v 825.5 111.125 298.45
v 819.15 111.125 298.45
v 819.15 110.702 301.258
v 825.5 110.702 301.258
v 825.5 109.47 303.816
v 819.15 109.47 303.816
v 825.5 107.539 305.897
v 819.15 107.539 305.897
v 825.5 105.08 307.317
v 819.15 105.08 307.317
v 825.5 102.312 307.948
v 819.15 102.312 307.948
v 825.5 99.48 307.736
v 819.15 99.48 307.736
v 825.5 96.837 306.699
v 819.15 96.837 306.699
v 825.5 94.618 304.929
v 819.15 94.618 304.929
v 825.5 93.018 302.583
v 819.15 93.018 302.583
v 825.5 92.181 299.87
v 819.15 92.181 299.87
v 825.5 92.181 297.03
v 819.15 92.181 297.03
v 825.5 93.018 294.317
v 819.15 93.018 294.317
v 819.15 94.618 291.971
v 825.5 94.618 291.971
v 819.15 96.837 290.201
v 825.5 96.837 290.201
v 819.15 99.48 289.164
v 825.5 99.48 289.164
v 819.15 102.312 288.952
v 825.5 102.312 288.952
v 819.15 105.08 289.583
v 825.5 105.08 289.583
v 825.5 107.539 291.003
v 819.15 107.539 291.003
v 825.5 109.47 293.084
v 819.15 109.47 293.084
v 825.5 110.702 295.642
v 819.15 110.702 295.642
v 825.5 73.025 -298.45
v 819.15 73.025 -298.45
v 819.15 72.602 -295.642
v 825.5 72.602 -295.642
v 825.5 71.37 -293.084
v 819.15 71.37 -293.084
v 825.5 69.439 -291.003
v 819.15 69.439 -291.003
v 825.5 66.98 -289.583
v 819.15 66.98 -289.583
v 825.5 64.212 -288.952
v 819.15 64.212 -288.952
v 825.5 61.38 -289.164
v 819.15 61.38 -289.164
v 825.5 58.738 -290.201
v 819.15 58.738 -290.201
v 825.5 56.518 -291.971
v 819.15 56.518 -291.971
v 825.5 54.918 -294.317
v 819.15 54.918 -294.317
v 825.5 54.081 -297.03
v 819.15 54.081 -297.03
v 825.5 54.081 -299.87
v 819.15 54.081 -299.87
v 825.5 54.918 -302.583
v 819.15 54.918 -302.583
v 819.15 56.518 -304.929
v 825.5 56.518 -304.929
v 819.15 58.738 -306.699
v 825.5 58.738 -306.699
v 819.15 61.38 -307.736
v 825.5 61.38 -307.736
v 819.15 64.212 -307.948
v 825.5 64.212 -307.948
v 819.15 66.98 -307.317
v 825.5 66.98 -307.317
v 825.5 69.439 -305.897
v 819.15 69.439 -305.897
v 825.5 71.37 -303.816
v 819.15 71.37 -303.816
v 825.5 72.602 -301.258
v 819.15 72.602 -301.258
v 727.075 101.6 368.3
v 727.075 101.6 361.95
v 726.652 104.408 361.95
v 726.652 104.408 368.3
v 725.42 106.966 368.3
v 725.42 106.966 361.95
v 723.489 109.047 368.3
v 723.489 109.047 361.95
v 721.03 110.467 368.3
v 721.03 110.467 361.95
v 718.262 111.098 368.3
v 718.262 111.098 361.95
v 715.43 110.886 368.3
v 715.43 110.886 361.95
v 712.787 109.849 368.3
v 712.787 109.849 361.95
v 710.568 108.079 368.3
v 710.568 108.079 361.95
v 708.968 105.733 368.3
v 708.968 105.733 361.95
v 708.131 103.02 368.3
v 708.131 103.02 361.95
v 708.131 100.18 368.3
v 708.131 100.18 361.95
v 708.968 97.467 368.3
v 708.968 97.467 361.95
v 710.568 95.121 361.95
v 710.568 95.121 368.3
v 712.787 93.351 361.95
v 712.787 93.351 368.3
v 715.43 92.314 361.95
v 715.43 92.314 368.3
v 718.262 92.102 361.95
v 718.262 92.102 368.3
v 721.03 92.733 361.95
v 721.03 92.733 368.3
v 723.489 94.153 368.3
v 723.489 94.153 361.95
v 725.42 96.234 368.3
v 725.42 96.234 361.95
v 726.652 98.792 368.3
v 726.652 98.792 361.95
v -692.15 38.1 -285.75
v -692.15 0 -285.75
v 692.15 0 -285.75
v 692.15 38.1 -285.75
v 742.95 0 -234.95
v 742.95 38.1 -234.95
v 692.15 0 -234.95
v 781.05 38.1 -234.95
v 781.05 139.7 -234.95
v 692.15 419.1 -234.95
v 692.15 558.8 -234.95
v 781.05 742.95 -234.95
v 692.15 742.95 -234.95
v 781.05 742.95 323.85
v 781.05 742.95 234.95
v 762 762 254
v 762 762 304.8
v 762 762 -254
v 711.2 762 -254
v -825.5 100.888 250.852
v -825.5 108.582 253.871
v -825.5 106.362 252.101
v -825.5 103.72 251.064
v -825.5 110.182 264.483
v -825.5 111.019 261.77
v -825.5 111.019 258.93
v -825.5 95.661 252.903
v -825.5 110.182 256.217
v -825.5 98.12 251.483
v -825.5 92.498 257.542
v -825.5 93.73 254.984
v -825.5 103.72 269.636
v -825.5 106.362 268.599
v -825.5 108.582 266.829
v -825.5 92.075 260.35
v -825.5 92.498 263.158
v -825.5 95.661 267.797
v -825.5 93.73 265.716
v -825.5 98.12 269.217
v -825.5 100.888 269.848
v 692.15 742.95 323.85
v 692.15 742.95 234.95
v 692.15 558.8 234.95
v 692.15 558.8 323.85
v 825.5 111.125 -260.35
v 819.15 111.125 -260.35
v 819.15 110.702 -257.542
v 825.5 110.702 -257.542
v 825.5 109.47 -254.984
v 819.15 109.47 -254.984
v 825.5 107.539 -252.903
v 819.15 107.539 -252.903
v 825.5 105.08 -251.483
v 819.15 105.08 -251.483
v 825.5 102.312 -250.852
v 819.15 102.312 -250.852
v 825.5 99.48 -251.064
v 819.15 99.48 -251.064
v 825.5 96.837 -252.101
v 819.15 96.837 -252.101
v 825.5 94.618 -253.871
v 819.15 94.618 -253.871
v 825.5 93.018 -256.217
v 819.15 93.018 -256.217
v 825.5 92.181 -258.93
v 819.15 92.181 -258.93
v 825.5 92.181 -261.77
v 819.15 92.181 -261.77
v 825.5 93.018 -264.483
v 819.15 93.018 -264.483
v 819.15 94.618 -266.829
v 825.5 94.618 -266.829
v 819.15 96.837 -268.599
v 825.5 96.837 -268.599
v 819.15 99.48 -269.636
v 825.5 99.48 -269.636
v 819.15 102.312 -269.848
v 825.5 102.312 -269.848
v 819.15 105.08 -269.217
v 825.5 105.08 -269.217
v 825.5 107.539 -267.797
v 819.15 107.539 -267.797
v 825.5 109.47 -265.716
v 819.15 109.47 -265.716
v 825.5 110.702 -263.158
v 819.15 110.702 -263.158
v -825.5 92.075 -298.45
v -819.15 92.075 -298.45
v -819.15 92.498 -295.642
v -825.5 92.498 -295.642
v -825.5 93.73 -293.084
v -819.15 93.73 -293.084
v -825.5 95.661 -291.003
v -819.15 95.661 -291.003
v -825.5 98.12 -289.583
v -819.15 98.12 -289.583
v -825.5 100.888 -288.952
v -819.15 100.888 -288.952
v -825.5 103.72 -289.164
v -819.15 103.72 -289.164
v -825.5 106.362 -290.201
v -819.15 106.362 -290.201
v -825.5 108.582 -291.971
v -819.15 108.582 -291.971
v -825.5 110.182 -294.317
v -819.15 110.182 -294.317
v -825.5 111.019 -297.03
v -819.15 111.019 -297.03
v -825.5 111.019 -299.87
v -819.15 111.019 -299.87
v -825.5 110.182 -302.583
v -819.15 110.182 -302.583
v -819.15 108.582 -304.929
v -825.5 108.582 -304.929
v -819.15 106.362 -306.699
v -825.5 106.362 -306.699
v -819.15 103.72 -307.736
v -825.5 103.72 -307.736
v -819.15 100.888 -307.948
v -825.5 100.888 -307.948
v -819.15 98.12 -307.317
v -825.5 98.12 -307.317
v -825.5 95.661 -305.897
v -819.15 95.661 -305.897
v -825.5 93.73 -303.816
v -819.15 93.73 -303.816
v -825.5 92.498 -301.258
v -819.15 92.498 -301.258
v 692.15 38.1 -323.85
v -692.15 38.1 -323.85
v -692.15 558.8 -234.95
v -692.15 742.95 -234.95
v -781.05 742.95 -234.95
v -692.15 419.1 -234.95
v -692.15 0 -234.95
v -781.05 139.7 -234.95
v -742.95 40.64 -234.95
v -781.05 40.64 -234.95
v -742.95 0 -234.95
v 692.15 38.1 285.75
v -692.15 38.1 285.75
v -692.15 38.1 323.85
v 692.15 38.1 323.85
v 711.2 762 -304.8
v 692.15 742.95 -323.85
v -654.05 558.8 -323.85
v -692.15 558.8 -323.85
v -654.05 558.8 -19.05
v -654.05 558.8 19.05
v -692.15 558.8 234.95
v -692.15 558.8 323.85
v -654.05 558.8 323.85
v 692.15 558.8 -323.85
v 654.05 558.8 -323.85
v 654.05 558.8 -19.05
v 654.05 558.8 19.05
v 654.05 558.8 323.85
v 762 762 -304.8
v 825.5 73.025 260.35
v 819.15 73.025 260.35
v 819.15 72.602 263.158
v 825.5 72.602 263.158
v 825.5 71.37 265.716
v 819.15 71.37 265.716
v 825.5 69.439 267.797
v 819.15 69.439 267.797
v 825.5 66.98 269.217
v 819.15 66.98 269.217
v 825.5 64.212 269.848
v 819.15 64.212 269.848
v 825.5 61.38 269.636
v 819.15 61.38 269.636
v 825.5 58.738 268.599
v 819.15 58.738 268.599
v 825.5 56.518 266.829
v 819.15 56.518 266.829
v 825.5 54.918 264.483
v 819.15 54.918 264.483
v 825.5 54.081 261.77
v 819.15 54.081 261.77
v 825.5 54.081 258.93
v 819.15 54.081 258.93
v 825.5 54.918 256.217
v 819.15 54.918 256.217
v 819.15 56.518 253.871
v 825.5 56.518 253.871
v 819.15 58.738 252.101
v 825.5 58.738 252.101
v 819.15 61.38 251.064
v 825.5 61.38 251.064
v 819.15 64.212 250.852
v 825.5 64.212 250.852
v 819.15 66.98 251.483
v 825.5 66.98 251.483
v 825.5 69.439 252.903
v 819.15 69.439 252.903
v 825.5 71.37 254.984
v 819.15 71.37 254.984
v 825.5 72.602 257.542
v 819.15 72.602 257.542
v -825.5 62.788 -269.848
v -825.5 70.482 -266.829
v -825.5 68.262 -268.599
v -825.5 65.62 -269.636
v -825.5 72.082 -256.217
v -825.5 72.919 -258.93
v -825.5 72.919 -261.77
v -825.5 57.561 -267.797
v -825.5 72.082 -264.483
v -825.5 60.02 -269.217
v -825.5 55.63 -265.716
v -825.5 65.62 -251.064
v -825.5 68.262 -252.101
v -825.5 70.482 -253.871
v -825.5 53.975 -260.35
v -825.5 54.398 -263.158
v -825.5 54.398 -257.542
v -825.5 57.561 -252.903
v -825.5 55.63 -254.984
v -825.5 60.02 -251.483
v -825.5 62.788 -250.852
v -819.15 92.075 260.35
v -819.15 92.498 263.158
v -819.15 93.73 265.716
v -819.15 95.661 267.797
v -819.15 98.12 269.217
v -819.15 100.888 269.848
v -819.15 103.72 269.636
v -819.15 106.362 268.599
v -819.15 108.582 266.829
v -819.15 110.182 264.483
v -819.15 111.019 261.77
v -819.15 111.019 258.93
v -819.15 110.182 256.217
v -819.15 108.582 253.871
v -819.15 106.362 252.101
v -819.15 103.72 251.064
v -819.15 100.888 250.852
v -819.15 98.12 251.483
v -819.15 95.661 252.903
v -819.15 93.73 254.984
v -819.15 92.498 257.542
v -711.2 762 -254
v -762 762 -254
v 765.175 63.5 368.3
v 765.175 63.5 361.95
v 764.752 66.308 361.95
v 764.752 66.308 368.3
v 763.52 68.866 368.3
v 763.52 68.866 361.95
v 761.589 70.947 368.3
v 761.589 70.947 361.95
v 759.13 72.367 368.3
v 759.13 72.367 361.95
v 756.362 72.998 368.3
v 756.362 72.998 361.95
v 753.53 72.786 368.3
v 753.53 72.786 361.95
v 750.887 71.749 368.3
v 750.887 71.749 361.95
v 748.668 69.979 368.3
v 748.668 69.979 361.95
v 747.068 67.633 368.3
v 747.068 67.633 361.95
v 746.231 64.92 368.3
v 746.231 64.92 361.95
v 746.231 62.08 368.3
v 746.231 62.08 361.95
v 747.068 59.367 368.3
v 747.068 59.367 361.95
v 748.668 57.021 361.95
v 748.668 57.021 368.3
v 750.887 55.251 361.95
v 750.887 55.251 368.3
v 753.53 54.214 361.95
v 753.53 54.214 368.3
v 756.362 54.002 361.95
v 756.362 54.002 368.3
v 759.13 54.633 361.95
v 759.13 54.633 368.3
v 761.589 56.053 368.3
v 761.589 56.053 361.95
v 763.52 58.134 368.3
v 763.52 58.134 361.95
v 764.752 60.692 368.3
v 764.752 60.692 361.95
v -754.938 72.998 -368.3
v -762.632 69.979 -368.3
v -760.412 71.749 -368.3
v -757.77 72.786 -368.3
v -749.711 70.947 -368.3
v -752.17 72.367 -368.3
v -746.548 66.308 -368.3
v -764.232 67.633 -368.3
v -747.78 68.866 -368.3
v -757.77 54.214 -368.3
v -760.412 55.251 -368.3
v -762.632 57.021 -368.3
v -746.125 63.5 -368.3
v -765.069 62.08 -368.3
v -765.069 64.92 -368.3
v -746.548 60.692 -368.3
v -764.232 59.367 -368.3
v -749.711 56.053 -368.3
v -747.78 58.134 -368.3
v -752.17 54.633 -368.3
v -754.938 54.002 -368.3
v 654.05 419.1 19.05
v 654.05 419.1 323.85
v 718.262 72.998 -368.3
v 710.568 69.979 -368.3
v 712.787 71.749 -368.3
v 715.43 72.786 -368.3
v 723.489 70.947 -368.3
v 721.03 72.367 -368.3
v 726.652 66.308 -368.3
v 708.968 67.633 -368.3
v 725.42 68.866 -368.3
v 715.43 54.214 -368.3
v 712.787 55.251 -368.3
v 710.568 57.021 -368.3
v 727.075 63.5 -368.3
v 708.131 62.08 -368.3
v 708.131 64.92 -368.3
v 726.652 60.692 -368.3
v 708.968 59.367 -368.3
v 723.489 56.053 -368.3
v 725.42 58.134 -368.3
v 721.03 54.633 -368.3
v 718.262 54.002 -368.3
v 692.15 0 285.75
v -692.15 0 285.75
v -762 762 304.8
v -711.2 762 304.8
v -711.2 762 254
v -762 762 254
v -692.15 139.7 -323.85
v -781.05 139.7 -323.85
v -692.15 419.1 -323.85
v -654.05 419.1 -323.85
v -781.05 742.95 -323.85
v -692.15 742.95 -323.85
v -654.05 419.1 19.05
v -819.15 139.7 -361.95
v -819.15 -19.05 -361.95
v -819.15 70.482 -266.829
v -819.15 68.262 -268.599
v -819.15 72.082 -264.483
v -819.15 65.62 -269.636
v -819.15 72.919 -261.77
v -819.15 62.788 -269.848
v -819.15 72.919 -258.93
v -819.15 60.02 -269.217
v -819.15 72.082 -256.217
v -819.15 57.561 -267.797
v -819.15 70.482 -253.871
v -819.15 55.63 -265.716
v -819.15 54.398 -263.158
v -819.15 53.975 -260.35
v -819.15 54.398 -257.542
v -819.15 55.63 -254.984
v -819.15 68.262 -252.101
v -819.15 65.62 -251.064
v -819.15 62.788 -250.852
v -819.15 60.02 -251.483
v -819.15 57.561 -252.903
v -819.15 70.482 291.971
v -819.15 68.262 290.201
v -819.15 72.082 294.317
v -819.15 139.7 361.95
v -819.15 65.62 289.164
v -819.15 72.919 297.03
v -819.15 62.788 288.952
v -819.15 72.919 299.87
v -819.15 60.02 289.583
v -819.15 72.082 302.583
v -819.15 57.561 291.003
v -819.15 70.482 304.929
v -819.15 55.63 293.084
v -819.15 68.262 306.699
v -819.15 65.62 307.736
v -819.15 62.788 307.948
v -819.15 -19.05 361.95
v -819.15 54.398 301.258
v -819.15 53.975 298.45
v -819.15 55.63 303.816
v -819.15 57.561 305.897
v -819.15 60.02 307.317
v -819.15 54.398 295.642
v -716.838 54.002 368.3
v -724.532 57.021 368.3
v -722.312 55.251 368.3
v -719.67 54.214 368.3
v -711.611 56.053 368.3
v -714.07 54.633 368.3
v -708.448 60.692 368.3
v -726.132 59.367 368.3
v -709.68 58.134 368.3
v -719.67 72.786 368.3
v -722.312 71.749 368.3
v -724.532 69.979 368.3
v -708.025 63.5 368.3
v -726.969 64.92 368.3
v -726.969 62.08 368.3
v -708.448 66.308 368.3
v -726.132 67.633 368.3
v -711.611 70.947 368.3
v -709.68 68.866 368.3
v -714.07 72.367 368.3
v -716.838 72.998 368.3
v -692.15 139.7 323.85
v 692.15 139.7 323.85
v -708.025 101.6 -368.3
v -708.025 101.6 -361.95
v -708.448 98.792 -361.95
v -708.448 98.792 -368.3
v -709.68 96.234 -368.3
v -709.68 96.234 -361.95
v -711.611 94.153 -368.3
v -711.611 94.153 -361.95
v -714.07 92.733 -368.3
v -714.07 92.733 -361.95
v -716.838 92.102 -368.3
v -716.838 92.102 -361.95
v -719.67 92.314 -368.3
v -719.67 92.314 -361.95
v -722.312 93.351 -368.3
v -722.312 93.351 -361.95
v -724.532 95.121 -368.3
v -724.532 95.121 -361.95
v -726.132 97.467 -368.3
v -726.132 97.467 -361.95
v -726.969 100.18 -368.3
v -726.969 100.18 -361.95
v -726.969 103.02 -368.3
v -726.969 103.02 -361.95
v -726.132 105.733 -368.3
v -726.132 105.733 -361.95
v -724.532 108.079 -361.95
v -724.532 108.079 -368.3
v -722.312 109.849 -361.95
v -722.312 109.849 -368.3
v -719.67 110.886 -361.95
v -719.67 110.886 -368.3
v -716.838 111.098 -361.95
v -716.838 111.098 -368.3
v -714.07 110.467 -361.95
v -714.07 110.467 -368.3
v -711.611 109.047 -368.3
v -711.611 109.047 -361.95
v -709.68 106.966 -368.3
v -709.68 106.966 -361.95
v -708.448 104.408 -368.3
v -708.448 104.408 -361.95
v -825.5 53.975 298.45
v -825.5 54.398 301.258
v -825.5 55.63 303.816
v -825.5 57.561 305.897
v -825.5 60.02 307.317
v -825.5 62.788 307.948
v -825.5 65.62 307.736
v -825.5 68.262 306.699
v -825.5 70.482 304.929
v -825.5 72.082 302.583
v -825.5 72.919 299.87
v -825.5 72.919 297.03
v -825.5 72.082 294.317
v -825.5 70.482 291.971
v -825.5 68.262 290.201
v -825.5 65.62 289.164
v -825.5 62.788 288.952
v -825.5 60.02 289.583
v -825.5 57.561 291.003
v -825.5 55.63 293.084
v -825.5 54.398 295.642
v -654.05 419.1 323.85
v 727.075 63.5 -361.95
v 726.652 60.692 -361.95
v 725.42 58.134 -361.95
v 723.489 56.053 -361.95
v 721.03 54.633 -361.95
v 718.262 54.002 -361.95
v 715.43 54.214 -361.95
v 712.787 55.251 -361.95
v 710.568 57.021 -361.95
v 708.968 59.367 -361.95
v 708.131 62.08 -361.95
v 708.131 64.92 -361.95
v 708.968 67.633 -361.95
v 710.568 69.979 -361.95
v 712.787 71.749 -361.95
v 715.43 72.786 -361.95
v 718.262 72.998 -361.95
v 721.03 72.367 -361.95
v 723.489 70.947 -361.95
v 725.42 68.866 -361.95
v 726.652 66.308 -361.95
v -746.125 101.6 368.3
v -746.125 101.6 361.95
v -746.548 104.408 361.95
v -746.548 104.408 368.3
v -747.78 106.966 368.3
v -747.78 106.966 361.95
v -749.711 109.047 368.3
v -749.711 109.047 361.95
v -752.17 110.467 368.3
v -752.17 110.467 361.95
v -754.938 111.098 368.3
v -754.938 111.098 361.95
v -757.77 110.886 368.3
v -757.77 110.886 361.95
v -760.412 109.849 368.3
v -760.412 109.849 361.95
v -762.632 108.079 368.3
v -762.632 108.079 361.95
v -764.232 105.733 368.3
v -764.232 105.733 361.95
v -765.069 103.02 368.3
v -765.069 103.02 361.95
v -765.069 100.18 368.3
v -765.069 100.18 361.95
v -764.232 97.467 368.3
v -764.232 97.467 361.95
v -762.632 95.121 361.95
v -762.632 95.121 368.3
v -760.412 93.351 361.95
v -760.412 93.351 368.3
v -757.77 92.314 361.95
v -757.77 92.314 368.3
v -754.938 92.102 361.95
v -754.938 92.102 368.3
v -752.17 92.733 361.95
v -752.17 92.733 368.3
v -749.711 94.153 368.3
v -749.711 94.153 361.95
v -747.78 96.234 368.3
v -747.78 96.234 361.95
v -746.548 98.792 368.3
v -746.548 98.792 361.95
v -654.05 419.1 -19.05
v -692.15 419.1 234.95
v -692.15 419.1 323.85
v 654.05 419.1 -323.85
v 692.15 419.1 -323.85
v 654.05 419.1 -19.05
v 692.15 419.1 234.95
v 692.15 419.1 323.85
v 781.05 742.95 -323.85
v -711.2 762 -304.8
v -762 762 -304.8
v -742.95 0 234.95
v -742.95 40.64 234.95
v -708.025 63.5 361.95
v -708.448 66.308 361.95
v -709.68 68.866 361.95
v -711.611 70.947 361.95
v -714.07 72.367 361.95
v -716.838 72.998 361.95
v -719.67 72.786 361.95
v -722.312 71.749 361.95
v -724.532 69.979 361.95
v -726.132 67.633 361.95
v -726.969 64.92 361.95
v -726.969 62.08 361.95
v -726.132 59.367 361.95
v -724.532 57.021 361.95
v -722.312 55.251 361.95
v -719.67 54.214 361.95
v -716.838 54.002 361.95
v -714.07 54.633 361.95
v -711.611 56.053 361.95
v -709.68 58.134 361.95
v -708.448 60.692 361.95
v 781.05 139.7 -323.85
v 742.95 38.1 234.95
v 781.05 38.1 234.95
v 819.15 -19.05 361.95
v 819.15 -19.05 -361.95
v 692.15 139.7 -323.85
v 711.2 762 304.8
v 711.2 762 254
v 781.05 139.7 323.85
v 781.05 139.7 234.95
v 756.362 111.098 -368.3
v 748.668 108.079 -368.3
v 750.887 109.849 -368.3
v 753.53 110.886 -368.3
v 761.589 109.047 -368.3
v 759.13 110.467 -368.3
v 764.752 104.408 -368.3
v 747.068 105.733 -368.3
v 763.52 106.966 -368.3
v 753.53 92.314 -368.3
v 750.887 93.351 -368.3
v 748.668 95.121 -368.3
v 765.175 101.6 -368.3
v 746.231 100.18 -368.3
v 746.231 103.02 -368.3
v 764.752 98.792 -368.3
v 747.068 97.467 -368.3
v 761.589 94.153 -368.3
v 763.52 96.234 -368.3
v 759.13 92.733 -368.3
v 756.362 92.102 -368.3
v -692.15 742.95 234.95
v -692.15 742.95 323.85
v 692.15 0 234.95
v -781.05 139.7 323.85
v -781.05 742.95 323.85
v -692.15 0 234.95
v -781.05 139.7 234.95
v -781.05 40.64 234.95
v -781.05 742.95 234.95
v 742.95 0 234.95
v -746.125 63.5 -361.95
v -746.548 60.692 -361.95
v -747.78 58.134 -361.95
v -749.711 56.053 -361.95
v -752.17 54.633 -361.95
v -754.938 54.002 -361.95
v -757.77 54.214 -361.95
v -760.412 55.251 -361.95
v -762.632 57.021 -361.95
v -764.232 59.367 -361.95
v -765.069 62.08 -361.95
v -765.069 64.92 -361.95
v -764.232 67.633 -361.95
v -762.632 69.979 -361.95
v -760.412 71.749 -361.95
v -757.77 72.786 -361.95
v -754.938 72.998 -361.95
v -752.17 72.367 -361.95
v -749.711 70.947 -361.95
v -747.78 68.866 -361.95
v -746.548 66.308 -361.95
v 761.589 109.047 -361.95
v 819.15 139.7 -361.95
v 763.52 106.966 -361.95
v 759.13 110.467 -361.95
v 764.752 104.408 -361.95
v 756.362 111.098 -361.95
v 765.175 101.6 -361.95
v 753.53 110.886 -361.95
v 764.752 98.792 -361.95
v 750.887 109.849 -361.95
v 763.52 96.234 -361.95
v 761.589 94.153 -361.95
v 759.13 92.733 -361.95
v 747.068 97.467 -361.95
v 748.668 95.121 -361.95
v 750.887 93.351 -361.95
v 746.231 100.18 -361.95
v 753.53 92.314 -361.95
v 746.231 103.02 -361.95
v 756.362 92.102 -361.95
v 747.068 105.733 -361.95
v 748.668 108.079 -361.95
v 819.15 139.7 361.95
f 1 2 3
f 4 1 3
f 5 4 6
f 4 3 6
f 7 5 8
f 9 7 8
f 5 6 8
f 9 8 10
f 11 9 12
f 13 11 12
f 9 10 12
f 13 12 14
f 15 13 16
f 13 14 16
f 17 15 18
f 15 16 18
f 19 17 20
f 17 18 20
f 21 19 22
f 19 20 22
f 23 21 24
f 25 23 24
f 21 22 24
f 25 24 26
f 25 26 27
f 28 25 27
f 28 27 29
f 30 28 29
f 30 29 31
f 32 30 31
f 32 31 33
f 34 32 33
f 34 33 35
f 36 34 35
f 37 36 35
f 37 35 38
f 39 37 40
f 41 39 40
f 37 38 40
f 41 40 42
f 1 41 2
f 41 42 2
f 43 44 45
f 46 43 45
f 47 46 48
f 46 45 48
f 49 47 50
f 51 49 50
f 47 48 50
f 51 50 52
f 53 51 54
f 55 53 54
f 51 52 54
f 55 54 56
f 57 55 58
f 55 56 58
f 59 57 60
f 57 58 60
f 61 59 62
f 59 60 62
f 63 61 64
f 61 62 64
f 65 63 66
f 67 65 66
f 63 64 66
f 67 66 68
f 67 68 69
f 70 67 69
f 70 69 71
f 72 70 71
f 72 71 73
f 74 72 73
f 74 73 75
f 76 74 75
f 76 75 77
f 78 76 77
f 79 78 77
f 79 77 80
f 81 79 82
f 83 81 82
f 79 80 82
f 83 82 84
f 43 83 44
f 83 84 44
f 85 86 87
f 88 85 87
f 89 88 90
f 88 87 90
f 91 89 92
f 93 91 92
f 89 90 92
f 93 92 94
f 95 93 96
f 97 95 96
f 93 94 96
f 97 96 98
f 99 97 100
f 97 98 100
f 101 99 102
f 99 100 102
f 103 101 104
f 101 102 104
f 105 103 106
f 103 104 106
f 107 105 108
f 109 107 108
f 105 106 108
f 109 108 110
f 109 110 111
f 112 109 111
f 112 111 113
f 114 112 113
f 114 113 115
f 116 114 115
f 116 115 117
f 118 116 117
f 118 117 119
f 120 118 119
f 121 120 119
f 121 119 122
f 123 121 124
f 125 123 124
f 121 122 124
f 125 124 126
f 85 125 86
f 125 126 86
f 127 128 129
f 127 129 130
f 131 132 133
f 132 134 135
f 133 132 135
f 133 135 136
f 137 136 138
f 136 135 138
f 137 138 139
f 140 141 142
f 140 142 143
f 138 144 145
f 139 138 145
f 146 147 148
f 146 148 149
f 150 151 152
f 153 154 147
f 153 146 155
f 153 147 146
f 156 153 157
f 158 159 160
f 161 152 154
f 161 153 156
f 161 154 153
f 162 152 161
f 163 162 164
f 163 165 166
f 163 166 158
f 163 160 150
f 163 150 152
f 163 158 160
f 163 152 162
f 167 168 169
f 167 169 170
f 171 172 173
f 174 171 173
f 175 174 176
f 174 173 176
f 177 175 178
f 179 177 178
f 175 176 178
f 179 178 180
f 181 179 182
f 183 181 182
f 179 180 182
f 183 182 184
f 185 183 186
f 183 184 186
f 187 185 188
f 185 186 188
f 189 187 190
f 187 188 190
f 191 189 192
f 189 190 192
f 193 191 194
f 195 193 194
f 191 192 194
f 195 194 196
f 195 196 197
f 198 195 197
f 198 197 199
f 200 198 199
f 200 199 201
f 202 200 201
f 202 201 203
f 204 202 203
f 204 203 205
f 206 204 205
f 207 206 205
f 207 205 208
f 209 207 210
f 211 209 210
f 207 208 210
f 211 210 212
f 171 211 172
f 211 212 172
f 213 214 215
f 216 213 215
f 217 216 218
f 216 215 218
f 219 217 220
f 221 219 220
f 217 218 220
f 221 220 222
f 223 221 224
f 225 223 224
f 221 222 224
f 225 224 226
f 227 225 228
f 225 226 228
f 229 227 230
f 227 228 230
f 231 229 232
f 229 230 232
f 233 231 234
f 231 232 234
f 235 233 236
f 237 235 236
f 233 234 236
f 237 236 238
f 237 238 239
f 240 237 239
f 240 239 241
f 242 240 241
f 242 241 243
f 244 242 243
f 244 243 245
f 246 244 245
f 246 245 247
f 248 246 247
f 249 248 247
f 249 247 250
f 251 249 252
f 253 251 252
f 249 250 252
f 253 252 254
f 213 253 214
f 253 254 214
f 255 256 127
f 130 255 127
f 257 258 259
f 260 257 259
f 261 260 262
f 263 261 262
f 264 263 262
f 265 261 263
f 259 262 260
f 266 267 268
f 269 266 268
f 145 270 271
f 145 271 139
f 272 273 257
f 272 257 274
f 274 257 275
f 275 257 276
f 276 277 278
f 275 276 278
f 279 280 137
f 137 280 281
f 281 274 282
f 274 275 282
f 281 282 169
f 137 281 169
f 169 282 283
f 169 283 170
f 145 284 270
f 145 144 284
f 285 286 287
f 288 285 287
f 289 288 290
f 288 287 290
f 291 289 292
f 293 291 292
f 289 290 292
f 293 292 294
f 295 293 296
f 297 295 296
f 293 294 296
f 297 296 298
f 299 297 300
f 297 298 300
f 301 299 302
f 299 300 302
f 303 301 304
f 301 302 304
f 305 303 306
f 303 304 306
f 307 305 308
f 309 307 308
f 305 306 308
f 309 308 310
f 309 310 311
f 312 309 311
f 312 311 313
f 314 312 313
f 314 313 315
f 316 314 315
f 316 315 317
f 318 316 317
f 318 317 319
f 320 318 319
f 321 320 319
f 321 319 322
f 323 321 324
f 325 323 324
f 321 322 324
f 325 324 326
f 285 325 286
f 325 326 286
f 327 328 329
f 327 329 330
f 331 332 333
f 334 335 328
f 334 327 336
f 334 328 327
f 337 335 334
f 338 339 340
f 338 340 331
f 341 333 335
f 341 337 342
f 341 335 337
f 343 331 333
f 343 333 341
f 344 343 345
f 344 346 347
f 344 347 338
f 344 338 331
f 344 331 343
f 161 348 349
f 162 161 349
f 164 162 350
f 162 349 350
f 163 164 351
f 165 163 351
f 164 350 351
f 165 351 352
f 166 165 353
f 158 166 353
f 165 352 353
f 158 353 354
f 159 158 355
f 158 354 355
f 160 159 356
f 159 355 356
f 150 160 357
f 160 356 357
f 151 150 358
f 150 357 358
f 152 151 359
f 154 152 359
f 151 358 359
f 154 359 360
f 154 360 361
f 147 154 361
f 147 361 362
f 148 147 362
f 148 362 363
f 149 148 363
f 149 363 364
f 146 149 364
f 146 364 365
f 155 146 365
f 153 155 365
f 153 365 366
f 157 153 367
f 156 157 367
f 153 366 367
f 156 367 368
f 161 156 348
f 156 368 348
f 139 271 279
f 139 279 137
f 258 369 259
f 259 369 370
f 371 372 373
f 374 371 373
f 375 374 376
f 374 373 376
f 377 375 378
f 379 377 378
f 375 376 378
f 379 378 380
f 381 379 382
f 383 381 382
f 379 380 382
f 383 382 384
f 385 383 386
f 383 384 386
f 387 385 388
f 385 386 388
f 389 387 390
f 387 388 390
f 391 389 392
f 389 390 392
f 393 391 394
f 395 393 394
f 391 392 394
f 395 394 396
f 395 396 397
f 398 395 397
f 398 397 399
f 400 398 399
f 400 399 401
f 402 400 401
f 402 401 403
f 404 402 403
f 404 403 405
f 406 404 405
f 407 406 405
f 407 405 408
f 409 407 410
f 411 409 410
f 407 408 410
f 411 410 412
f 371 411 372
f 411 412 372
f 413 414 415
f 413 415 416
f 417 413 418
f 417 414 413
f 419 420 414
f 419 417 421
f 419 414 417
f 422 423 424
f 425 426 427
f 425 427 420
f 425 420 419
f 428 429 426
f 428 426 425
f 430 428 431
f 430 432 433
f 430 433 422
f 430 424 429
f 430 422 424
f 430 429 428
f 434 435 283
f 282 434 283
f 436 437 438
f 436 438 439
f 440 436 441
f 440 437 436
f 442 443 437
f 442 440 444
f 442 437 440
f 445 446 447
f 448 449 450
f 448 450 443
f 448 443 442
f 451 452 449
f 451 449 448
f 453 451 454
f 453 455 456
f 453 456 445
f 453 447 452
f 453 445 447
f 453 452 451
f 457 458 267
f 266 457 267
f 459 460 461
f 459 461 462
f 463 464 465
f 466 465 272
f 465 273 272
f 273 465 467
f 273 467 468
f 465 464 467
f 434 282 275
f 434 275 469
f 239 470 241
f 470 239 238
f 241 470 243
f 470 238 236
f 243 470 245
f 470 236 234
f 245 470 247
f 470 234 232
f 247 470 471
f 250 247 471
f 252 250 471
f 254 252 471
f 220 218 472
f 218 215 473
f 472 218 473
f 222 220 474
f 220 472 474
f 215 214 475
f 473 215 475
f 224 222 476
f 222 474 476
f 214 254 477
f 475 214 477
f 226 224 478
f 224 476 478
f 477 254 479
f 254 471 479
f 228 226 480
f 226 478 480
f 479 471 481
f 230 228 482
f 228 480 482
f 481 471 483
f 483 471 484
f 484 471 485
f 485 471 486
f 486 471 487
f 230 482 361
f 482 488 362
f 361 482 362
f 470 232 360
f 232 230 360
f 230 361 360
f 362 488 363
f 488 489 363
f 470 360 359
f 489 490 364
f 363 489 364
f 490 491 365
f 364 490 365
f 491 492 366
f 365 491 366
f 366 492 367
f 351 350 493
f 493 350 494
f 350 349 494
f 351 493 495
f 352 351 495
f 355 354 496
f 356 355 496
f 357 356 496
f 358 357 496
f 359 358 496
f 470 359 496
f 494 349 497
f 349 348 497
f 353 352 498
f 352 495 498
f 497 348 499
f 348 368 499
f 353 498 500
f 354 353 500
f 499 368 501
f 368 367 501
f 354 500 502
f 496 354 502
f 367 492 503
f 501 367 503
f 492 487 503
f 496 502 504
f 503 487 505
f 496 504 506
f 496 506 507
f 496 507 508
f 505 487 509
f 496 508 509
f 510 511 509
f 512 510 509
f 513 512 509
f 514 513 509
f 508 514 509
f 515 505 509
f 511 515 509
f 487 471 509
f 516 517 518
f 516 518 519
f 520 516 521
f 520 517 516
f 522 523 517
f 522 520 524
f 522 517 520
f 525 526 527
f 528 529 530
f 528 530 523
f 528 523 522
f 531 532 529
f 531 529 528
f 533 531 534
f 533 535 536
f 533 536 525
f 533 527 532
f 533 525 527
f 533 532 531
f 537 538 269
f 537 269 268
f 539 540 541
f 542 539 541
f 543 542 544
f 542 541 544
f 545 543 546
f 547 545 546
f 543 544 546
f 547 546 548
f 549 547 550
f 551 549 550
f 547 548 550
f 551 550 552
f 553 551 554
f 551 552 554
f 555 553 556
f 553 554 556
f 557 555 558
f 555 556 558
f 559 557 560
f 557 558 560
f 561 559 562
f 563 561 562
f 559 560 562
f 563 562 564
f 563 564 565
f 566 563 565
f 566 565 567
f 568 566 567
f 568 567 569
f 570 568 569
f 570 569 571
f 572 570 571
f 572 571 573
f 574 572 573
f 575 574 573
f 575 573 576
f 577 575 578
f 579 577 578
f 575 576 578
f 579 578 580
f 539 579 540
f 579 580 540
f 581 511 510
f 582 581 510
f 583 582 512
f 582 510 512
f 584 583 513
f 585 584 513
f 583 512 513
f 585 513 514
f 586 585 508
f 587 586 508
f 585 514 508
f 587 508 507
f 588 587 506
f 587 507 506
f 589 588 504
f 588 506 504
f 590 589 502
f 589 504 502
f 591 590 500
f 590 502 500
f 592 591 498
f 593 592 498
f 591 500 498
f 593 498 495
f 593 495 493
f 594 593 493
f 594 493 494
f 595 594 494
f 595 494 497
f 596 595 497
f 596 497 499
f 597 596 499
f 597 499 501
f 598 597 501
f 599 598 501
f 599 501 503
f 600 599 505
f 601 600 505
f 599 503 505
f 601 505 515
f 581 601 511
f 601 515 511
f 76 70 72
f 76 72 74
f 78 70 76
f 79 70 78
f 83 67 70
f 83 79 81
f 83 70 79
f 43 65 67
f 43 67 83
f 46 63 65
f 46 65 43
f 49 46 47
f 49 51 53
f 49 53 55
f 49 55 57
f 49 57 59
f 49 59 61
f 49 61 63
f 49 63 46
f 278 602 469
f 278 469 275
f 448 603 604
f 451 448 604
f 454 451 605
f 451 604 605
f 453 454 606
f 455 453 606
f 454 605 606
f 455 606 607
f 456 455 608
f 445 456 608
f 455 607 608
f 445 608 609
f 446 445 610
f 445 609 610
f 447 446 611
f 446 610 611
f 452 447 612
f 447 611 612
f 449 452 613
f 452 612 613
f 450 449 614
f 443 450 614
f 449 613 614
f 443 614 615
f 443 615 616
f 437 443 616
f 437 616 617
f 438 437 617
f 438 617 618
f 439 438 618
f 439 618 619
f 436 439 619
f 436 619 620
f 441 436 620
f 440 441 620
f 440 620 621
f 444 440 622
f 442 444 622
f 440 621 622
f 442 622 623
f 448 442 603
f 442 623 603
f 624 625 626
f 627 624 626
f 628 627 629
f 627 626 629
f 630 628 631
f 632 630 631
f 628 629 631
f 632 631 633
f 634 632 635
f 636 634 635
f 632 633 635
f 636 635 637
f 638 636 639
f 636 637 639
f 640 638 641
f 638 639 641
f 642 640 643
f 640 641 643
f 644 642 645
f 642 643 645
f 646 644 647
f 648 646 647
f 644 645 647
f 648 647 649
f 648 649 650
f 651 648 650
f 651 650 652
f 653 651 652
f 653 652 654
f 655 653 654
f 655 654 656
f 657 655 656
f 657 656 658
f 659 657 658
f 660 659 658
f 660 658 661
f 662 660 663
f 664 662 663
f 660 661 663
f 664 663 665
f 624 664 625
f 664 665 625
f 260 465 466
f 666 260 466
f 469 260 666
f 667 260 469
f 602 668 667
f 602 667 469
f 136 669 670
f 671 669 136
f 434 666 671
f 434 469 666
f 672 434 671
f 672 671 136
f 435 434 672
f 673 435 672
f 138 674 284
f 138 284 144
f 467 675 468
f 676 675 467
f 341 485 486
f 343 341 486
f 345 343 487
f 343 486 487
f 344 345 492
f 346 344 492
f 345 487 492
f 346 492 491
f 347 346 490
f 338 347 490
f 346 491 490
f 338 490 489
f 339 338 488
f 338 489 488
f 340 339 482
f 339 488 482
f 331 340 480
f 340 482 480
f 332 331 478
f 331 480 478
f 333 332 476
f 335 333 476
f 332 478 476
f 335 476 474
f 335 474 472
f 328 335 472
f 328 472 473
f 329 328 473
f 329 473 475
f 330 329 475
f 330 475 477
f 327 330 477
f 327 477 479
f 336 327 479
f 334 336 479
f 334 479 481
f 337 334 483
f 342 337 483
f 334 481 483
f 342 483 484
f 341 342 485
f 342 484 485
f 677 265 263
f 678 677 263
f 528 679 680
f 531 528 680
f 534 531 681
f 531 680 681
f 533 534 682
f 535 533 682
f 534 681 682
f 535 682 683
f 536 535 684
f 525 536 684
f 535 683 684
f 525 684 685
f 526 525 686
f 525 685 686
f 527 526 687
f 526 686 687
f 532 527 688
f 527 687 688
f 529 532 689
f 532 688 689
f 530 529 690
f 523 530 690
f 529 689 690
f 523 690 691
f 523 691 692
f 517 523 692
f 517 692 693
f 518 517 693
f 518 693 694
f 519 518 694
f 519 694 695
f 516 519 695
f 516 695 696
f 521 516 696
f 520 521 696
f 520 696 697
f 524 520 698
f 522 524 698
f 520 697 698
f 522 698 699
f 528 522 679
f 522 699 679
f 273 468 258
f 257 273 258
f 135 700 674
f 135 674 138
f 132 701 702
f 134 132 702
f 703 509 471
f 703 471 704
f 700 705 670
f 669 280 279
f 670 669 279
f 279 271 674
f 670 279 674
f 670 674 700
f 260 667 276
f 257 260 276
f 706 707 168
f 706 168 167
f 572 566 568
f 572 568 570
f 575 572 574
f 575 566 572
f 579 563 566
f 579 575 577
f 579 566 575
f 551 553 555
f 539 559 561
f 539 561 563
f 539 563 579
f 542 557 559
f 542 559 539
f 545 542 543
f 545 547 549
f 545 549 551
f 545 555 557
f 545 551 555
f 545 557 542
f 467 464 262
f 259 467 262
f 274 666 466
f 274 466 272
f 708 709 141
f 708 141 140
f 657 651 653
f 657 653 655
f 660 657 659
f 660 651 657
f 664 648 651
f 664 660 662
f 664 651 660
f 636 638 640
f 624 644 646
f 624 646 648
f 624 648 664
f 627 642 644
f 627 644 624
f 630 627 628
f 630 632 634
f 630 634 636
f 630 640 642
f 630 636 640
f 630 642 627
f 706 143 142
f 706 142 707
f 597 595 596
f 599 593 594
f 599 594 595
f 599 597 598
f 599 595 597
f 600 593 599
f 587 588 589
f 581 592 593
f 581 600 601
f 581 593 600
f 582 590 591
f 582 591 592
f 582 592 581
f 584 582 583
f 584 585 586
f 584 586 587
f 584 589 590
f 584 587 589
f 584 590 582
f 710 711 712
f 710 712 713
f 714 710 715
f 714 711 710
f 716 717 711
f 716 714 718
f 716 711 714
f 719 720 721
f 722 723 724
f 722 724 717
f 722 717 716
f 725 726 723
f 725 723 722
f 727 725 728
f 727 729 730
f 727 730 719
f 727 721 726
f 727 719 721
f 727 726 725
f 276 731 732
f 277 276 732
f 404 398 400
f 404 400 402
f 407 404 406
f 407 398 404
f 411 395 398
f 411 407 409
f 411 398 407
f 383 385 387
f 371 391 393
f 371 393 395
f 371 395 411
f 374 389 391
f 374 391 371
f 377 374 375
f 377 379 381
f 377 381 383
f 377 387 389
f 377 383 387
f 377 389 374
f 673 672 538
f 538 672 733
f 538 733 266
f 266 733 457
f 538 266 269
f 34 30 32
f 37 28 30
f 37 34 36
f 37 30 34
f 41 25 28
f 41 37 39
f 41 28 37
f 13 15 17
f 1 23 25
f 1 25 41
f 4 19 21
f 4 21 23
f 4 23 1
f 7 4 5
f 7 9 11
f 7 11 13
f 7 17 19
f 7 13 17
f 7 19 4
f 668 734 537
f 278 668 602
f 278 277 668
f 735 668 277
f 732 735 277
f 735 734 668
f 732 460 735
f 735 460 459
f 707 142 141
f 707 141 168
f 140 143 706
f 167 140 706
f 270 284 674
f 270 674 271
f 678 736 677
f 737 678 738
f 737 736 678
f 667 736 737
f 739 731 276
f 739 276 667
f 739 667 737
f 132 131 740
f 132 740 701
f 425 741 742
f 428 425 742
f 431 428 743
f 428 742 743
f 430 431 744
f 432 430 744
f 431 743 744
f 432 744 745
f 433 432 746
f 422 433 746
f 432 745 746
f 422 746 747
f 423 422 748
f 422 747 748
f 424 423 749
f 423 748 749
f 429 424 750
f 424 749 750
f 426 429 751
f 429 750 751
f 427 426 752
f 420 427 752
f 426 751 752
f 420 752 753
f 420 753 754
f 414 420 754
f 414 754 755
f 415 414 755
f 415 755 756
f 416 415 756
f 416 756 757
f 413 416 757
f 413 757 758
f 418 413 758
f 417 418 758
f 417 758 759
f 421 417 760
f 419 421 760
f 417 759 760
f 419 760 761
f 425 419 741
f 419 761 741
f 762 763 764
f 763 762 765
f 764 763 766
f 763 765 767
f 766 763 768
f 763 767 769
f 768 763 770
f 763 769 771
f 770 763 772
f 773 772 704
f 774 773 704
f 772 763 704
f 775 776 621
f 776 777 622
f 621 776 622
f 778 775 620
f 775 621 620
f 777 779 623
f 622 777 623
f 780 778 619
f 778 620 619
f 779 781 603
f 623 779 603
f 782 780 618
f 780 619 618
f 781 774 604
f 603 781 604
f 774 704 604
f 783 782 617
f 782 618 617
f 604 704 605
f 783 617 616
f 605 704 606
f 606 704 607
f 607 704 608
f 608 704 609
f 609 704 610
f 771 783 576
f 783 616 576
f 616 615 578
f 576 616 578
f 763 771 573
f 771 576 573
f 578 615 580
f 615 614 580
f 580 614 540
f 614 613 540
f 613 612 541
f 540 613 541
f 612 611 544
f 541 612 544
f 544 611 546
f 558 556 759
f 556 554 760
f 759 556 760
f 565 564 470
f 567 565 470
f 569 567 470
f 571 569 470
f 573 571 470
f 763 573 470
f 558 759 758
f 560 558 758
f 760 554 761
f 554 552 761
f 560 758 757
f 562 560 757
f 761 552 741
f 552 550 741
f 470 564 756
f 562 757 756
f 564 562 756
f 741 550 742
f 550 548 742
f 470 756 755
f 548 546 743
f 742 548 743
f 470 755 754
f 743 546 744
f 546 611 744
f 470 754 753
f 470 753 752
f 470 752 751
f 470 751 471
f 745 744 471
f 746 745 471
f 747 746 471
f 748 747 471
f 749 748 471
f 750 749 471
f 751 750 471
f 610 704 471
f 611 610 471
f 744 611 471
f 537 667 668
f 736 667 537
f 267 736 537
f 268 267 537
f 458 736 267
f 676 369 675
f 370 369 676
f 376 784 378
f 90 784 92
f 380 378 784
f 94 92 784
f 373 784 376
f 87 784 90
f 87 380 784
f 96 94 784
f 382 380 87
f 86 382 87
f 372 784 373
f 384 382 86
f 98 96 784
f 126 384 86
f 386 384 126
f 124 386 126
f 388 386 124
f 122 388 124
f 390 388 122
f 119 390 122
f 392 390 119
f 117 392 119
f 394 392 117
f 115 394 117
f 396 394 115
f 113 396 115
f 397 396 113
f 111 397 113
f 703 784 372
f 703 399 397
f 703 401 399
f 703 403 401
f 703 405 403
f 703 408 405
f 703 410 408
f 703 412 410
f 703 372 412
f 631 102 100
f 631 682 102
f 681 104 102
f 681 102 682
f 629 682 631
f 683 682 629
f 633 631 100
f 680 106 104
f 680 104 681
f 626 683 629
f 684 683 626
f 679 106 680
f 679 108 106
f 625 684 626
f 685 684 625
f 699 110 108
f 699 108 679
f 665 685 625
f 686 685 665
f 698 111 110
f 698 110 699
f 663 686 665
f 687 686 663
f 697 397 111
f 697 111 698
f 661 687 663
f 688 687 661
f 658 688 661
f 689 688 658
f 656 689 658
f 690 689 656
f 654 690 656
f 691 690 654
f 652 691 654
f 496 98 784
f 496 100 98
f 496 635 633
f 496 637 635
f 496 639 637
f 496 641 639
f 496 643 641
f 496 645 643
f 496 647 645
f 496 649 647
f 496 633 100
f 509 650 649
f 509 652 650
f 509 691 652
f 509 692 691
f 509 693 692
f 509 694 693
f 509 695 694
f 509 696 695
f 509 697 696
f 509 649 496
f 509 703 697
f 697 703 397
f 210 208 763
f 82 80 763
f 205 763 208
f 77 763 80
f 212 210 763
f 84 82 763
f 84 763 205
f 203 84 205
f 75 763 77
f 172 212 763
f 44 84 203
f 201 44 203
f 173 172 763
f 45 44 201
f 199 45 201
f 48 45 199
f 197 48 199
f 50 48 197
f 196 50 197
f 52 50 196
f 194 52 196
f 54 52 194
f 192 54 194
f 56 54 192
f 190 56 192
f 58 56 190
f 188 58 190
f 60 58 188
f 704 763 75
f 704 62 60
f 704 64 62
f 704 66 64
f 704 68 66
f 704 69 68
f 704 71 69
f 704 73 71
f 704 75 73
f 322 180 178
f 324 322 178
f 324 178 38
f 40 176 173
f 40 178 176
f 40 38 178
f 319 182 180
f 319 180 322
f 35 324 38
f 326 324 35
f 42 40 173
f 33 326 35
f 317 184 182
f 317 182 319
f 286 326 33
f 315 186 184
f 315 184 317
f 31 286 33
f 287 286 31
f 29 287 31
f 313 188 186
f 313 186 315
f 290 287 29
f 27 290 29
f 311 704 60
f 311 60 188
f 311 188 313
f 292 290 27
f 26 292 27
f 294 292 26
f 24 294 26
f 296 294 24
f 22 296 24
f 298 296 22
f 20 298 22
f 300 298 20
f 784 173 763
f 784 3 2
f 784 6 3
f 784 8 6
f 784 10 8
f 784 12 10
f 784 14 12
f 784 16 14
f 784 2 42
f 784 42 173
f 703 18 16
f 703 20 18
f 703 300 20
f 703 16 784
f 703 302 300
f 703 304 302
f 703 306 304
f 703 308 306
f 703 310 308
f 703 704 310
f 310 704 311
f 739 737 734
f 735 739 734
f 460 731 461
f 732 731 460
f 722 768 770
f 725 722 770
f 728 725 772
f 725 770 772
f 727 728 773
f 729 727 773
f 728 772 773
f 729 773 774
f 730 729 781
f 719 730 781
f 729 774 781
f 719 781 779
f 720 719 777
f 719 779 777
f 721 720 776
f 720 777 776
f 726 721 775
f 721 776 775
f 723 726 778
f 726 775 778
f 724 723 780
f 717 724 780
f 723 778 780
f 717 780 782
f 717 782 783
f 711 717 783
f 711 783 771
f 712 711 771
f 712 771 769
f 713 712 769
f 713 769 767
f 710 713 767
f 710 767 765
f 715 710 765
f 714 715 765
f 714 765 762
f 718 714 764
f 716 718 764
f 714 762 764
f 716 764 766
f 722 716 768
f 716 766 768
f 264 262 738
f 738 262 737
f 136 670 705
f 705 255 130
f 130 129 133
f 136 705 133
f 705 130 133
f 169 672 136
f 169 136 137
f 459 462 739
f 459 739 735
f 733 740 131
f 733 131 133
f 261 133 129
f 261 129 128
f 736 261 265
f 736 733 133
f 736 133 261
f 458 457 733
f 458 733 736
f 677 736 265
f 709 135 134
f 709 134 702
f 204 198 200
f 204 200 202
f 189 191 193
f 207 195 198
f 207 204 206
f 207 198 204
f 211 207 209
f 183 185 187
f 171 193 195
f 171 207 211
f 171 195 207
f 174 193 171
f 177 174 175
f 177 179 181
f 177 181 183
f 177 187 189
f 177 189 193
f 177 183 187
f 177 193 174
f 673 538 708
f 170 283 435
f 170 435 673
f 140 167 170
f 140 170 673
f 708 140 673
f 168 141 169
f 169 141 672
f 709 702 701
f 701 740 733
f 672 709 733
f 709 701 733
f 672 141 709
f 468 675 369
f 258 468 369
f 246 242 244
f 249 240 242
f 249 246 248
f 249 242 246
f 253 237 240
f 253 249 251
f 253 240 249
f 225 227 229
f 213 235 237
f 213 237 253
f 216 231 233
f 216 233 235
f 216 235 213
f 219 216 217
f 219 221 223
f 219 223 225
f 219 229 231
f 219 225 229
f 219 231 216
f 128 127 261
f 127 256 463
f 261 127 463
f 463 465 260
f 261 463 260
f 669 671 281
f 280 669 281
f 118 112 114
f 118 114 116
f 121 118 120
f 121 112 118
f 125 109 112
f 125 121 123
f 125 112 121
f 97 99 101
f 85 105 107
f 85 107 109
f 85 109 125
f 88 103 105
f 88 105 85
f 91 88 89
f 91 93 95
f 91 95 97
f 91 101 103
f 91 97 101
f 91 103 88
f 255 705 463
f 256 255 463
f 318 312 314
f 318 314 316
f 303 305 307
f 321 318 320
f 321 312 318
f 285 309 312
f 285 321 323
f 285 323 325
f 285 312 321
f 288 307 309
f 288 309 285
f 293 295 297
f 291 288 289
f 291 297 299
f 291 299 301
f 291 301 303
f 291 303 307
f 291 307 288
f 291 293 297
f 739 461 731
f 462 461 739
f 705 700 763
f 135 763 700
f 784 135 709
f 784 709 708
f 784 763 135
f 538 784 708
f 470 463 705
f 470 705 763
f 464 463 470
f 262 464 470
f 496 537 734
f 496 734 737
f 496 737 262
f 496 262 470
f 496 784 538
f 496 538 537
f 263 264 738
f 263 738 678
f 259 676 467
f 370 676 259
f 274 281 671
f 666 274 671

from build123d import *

# Parameters (mm, degrees)
F0_W           = 1638.3
F0_H           = 723.9
F1_DEPTH       = 19.05
F2_W           = 1638.3
F2_H           = 723.9
F3_DEPTH       = 139.7
F5_W           = 1562.1
F5_H           = 647.7
F6_DEPTH       = 139.7
F4_W           = 88.9
F4_H           = 88.9
F7_DEPTH       = 139.7
F7_DEPTH_BACK  = 622.3
F8_W           = 38.1
F8_H           = 139.7
F9_DEPTH       = 647.7
F10_W          = 38.1
F10_H          = 139.7
F11_DEPTH      = 647.7
F12_SIZE       = 19.05
F13_R          = 9.525
F14_DEPTH      = 6.35
F14_DEPTH_BACK = 76.2
F15_W          = 139.7
F15_H          = 38.1
F16_DEPTH      = 1308.1
F17_W          = 38.1
F17_H          = 38.1
F18_DEPTH      = 1384.3
F19_W          = 38.1
F19_H          = 38.1
F20_DEPTH      = 469.9
F21_W          = 38.1
F21_H          = 40.64
F22_DEPTH      = 520.7
F23_W          = 38.1
F23_H          = 38.1
F24_DEPTH      = 1384.3
F25_R          = 9.525
F26_DEPTH      = 6.35
F26_DEPTH_BACK = 76.2
F27_R          = 9.525
F28_DEPTH      = 6.35
F28_DEPTH_BACK = 76.2
F29_R          = 9.525
F30_DEPTH      = 6.35
F30_DEPTH_BACK = 76.2
F31_R          = 9.525
F32_DEPTH      = 6.35
F32_DEPTH_BACK = 76.2


with BuildPart() as f1:
    # F0 (on Front) → F1 (new body)
    with BuildSketch(Plane.XZ):
        Rectangle(F0_W, F0_H)
    extrude(amount=F1_DEPTH)

    # F2 (on face) → F3 (join)
    with BuildSketch(Plane(origin=(0, 0, 0), x_dir=(-1, 0, 0), z_dir=(0, 1, 0))):
        Rectangle(F2_W, F2_H)
    extrude(amount=F3_DEPTH)

    # F5 (on face) → F6 (cut)
    with BuildSketch(Plane(origin=(0, 139.7, 0), x_dir=(-1, 0, 0), z_dir=(0, 1, 0))):
        Rectangle(F5_W, F5_H)
    extrude(amount=-F6_DEPTH, mode=Mode.SUBTRACT)

    # F4 (on face) → F7 (join, two sides)
    with BuildSketch(Plane(origin=(0, 139.7, 0), x_dir=(-1, 0, 0), z_dir=(0, 1, 0))) as f7_sk:
        with Locations((-736.6, 279.4)):
            Rectangle(F4_W, F4_H)
        with Locations((736.6, 279.4)):
            Rectangle(F4_W, F4_H)
        with Locations((736.6, -279.4)):
            Rectangle(F4_W, F4_H)
        with Locations((-736.6, -279.4)):
            Rectangle(F4_W, F4_H)
    extrude(amount=-F7_DEPTH)
    extrude(f7_sk.sketch, amount=F7_DEPTH_BACK)

    # F8 (on face) → F9 (join)
    with BuildSketch(Plane.XY.offset(323.85)):
        with Locations((-673.1, 488.95)):
            Rectangle(F8_W, F8_H)
    extrude(amount=-F9_DEPTH)

    # F10 (on face) → F11 (join)
    with BuildSketch(Plane.XY.offset(323.85)):
        with Locations((673.1, 488.95)):
            Rectangle(F10_W, F10_H)
    extrude(amount=-F11_DEPTH)

    # F12
    f12_edges = [f1.edges().sort_by_distance(p)[0] for p in [
        (736.6, 762, -323.85),
        (781.05, 762, -279.4),
        (736.6, 762, -234.95),
        (692.15, 762, -279.4),
        (736.6, 762, 323.85),
        (692.15, 762, 279.4),
        (781.05, 762, 279.4),
        (736.6, 762, 234.95),
        (-736.6, 762, 323.85),
        (-736.6, 762, 234.95),
        (-692.15, 762, 279.4),
        (-781.05, 762, 279.4),
        (-736.6, 762, -234.95),
        (-781.05, 762, -279.4),
        (-736.6, 762, -323.85),
        (-692.15, 762, -279.4),
    ]]
    chamfer(f12_edges, length=F12_SIZE)

    # F13 (on face) → F14 (join, two sides)
    with BuildSketch(Plane.XY.offset(361.95)) as f14_sk:
        with Locations((-755.65, 101.6)):
            Circle(F13_R)
        with Locations((-717.55, 63.5)):
            Circle(F13_R)
    extrude(amount=F14_DEPTH)
    extrude(f14_sk.sketch, amount=-F14_DEPTH_BACK)

    # F15 (on face) → F16 (join)
    with BuildSketch(Plane(origin=(654.05, 0, 0), x_dir=(0, -1, 0), z_dir=(-1, 0, 0))):
        with Locations((-488.95, 0)):
            Rectangle(F15_W, F15_H)
    extrude(amount=F16_DEPTH)

    # F17 (on face) → F18 (join)
    with BuildSketch(Plane.YZ.offset(-692.15)):
        with Locations((19.05, -304.8)):
            Rectangle(F17_W, F17_H)
    extrude(amount=F18_DEPTH)

    # F19 (on face) → F20 (join)
    with BuildSketch(Plane.XY.offset(-234.95)):
        with Locations((762, 19.05)):
            Rectangle(F19_W, F19_H)
    extrude(amount=F20_DEPTH)

    # F21 (on face) → F22 (join)
    with BuildSketch(Plane.XY.offset(-234.95)):
        with Locations((-762, 20.32)):
            Rectangle(F21_W, F21_H)
    extrude(amount=F22_DEPTH)

    # F23 (on face) → F24 (join)
    with BuildSketch(Plane.YZ.offset(-692.15)):
        with Locations((19.05, 304.8)):
            Rectangle(F23_W, F23_H)
    extrude(amount=F24_DEPTH)

    # F25 (on face) → F26 (join, two sides)
    with BuildSketch(Plane.XY.offset(361.95)) as f26_sk:
        with Locations((717.55, 101.6)):
            Circle(F25_R)
        with Locations((755.65, 63.5)):
            Circle(F25_R)
    extrude(amount=F26_DEPTH)
    extrude(f26_sk.sketch, amount=-F26_DEPTH_BACK)

    # F27 (on face) → F28 (join, two sides)
    with BuildSketch(Plane(origin=(-819.15, 0, 0), x_dir=(0, -1, 0), z_dir=(-1, 0, 0))) as f28_sk:
        with Locations((-101.6, 260.35)):
            Circle(F27_R)
        with Locations((-63.5, 298.45)):
            Circle(F27_R)
        with Locations((-101.6, -298.45)):
            Circle(F27_R)
        with Locations((-63.5, -260.35)):
            Circle(F27_R)
    extrude(amount=F28_DEPTH)
    extrude(f28_sk.sketch, amount=-F28_DEPTH_BACK)

    # F29 (on face) → F30 (join, two sides)
    with BuildSketch(Plane.YZ.offset(819.15)) as f30_sk:
        with Locations((101.6, 298.45)):
            Circle(F29_R)
        with Locations((101.6, -260.35)):
            Circle(F29_R)
        with Locations((63.5, 260.35)):
            Circle(F29_R)
        with Locations((63.5, -298.45)):
            Circle(F29_R)
    extrude(amount=F30_DEPTH)
    extrude(f30_sk.sketch, amount=-F30_DEPTH_BACK)

    # F31 (on face) → F32 (join, two sides)
    with BuildSketch(Plane(origin=(0, 0, -361.95), x_dir=(1, 0, 0), z_dir=(0, 0, -1))) as f32_sk:
        with Locations((-755.65, -63.5)):
            Circle(F31_R)
        with Locations((-717.55, -101.6)):
            Circle(F31_R)
        with Locations((717.55, -63.5)):
            Circle(F31_R)
        with Locations((755.65, -101.6)):
            Circle(F31_R)
    extrude(amount=F32_DEPTH)
    extrude(f32_sk.sketch, amount=-F32_DEPTH_BACK)


solid = f1.part
